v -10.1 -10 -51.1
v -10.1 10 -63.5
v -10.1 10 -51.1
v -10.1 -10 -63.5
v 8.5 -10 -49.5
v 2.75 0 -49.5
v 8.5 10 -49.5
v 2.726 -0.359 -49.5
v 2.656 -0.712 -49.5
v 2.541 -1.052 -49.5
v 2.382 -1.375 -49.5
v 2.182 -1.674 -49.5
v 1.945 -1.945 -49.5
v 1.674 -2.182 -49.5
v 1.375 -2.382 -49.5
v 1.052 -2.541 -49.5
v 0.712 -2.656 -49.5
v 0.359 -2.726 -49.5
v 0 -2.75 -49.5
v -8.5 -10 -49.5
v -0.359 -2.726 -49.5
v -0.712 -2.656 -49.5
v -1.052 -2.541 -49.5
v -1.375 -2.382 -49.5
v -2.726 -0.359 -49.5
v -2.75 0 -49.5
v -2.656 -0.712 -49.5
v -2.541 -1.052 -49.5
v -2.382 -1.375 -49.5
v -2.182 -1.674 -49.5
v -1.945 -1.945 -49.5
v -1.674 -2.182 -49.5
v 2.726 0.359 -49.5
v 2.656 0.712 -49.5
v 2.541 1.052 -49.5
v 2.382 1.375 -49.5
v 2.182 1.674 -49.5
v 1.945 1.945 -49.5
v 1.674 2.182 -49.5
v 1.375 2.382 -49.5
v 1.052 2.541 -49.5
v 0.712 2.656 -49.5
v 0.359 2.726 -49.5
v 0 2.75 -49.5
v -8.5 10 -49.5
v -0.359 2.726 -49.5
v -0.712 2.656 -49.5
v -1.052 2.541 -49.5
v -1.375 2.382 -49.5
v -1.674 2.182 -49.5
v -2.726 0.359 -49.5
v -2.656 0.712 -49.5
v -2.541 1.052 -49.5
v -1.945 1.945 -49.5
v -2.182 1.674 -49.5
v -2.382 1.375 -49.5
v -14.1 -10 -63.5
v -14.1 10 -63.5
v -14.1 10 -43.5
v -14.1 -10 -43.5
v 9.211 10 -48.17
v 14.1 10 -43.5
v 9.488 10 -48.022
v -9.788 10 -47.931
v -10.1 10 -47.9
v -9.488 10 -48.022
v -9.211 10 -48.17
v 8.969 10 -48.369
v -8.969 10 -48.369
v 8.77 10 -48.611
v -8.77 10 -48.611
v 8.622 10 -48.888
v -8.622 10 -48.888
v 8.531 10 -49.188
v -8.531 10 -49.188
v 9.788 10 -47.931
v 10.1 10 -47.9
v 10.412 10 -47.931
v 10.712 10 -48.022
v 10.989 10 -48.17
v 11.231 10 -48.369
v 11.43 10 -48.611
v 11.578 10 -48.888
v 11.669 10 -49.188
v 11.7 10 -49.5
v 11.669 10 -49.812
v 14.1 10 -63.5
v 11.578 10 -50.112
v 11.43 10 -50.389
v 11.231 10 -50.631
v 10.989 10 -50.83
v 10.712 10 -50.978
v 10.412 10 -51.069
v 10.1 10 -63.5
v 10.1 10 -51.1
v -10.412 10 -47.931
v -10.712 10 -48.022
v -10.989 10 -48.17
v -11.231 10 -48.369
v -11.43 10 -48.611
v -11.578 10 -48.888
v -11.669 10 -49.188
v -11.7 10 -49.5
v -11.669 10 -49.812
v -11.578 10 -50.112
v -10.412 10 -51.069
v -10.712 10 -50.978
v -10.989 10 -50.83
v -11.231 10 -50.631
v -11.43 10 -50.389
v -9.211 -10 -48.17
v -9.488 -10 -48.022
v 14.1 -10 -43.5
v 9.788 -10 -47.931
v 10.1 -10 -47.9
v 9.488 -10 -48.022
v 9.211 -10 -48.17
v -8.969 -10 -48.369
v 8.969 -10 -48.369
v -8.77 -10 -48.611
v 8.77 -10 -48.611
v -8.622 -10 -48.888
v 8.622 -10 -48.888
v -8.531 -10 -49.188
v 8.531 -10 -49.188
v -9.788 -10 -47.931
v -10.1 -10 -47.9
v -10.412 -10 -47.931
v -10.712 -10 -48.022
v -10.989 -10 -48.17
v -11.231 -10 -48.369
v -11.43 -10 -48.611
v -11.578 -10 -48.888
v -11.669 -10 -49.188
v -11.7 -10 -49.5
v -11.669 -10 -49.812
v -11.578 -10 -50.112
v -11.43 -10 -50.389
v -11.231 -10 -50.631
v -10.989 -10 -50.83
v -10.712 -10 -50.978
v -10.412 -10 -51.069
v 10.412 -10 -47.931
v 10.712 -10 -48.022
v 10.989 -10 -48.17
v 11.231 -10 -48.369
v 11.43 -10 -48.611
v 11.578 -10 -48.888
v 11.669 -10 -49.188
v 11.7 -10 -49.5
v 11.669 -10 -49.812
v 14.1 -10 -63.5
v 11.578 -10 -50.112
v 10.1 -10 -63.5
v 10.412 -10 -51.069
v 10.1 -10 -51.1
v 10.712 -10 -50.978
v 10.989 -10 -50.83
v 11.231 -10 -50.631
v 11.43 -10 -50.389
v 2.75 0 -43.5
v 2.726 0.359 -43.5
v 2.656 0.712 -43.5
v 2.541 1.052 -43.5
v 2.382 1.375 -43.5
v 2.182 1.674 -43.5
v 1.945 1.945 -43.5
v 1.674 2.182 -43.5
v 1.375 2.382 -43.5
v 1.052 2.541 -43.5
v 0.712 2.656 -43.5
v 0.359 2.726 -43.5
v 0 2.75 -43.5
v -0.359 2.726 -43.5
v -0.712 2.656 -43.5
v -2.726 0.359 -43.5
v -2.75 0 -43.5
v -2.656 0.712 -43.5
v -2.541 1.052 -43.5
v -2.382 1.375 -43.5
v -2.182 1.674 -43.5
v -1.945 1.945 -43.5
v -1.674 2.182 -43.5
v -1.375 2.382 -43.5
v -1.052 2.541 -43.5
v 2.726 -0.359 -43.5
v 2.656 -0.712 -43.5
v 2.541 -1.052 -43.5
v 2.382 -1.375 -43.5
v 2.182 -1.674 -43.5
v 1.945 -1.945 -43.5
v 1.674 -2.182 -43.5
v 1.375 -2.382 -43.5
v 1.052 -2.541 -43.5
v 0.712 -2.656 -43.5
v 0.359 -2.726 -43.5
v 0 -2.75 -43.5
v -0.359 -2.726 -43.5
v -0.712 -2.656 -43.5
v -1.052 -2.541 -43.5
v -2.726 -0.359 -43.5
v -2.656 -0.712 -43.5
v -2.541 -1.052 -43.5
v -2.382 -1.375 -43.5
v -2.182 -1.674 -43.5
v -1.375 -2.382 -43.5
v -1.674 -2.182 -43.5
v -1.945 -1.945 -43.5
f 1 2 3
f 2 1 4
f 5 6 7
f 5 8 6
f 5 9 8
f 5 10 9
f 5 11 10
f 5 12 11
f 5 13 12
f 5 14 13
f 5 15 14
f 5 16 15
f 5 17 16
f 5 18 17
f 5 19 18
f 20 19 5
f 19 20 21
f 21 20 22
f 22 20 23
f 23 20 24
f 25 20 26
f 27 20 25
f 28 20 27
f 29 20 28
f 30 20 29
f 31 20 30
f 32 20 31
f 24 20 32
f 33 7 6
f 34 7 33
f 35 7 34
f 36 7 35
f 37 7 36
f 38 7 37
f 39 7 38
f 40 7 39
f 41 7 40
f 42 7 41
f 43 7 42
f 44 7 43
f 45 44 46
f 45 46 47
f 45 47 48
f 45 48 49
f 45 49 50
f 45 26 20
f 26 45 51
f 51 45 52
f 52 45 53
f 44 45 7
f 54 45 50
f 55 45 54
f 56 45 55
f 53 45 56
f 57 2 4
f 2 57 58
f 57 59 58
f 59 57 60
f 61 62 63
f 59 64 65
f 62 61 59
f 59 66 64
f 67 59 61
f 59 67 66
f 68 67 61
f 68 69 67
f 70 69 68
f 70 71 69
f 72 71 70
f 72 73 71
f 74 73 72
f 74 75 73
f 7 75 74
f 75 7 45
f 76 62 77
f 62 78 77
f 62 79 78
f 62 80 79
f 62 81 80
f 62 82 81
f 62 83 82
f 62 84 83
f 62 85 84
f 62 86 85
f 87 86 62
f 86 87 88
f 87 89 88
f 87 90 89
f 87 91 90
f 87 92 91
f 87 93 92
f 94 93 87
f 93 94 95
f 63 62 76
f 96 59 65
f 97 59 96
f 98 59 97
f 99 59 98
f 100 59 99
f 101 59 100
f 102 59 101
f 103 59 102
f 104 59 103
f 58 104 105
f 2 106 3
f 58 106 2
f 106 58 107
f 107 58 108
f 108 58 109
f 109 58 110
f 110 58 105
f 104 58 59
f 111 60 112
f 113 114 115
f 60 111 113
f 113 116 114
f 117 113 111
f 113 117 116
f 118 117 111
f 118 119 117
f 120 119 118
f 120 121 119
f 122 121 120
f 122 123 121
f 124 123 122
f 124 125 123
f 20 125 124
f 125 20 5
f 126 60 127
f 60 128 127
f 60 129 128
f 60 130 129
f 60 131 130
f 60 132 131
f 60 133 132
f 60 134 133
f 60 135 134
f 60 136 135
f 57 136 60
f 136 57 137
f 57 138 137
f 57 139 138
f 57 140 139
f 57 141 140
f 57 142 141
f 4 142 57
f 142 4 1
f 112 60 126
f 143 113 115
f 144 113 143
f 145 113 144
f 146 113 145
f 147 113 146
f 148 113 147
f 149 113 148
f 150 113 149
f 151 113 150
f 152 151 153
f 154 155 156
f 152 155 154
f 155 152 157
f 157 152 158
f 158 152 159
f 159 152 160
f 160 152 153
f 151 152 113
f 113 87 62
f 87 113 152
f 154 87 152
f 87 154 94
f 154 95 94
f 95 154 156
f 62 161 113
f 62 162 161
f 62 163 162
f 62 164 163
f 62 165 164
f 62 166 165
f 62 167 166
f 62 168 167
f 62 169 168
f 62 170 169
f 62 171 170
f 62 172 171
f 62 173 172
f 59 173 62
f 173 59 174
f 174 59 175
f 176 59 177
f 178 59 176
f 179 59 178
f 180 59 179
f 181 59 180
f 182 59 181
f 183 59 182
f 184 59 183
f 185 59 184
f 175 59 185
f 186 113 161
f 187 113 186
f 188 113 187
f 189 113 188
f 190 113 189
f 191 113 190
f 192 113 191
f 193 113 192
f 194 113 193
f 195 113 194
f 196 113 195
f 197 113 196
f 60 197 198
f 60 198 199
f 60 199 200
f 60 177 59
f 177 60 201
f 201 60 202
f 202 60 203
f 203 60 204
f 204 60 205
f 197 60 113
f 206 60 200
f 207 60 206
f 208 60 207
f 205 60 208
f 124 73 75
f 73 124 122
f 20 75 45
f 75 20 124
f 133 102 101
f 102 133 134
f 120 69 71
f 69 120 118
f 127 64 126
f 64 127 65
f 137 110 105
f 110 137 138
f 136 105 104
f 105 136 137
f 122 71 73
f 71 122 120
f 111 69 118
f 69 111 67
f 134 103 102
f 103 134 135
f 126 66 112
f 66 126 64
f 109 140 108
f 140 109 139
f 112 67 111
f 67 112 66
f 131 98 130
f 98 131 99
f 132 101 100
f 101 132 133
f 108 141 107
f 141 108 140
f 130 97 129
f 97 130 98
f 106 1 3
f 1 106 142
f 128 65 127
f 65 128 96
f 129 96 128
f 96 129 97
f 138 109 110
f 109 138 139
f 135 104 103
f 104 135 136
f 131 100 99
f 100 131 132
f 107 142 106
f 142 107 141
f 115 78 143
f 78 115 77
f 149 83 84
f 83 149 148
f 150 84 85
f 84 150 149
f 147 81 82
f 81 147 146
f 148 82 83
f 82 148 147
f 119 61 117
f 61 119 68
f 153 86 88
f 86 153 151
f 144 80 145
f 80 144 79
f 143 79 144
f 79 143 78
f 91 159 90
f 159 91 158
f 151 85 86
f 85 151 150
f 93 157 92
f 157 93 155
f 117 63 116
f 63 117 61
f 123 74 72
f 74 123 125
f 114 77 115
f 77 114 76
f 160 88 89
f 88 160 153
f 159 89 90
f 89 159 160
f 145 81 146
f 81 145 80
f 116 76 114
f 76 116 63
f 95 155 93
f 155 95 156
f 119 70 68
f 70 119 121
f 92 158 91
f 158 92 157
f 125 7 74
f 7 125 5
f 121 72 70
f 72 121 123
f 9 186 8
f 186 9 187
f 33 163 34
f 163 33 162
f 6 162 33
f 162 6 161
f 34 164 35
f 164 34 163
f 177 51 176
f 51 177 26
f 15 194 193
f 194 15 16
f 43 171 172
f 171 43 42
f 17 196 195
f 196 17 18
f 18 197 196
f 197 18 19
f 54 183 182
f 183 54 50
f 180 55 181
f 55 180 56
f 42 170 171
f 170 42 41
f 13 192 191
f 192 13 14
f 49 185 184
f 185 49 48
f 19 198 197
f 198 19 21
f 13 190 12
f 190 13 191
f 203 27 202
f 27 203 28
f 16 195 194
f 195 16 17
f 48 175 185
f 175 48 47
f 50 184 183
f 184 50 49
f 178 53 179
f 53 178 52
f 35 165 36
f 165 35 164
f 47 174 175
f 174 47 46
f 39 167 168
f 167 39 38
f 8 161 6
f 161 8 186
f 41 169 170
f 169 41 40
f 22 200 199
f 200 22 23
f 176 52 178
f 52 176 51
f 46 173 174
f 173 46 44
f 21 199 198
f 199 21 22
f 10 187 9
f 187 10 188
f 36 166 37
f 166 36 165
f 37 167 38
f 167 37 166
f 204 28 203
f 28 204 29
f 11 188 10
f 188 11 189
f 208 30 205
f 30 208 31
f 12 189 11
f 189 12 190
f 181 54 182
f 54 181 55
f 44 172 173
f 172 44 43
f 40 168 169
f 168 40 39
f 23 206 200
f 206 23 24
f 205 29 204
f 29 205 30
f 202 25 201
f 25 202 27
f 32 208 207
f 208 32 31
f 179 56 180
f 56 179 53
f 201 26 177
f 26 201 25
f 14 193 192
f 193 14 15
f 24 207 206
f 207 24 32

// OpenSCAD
skip_main_render = true;
include <../../optical_setup.scad>

post_mount_socket_coupon();
